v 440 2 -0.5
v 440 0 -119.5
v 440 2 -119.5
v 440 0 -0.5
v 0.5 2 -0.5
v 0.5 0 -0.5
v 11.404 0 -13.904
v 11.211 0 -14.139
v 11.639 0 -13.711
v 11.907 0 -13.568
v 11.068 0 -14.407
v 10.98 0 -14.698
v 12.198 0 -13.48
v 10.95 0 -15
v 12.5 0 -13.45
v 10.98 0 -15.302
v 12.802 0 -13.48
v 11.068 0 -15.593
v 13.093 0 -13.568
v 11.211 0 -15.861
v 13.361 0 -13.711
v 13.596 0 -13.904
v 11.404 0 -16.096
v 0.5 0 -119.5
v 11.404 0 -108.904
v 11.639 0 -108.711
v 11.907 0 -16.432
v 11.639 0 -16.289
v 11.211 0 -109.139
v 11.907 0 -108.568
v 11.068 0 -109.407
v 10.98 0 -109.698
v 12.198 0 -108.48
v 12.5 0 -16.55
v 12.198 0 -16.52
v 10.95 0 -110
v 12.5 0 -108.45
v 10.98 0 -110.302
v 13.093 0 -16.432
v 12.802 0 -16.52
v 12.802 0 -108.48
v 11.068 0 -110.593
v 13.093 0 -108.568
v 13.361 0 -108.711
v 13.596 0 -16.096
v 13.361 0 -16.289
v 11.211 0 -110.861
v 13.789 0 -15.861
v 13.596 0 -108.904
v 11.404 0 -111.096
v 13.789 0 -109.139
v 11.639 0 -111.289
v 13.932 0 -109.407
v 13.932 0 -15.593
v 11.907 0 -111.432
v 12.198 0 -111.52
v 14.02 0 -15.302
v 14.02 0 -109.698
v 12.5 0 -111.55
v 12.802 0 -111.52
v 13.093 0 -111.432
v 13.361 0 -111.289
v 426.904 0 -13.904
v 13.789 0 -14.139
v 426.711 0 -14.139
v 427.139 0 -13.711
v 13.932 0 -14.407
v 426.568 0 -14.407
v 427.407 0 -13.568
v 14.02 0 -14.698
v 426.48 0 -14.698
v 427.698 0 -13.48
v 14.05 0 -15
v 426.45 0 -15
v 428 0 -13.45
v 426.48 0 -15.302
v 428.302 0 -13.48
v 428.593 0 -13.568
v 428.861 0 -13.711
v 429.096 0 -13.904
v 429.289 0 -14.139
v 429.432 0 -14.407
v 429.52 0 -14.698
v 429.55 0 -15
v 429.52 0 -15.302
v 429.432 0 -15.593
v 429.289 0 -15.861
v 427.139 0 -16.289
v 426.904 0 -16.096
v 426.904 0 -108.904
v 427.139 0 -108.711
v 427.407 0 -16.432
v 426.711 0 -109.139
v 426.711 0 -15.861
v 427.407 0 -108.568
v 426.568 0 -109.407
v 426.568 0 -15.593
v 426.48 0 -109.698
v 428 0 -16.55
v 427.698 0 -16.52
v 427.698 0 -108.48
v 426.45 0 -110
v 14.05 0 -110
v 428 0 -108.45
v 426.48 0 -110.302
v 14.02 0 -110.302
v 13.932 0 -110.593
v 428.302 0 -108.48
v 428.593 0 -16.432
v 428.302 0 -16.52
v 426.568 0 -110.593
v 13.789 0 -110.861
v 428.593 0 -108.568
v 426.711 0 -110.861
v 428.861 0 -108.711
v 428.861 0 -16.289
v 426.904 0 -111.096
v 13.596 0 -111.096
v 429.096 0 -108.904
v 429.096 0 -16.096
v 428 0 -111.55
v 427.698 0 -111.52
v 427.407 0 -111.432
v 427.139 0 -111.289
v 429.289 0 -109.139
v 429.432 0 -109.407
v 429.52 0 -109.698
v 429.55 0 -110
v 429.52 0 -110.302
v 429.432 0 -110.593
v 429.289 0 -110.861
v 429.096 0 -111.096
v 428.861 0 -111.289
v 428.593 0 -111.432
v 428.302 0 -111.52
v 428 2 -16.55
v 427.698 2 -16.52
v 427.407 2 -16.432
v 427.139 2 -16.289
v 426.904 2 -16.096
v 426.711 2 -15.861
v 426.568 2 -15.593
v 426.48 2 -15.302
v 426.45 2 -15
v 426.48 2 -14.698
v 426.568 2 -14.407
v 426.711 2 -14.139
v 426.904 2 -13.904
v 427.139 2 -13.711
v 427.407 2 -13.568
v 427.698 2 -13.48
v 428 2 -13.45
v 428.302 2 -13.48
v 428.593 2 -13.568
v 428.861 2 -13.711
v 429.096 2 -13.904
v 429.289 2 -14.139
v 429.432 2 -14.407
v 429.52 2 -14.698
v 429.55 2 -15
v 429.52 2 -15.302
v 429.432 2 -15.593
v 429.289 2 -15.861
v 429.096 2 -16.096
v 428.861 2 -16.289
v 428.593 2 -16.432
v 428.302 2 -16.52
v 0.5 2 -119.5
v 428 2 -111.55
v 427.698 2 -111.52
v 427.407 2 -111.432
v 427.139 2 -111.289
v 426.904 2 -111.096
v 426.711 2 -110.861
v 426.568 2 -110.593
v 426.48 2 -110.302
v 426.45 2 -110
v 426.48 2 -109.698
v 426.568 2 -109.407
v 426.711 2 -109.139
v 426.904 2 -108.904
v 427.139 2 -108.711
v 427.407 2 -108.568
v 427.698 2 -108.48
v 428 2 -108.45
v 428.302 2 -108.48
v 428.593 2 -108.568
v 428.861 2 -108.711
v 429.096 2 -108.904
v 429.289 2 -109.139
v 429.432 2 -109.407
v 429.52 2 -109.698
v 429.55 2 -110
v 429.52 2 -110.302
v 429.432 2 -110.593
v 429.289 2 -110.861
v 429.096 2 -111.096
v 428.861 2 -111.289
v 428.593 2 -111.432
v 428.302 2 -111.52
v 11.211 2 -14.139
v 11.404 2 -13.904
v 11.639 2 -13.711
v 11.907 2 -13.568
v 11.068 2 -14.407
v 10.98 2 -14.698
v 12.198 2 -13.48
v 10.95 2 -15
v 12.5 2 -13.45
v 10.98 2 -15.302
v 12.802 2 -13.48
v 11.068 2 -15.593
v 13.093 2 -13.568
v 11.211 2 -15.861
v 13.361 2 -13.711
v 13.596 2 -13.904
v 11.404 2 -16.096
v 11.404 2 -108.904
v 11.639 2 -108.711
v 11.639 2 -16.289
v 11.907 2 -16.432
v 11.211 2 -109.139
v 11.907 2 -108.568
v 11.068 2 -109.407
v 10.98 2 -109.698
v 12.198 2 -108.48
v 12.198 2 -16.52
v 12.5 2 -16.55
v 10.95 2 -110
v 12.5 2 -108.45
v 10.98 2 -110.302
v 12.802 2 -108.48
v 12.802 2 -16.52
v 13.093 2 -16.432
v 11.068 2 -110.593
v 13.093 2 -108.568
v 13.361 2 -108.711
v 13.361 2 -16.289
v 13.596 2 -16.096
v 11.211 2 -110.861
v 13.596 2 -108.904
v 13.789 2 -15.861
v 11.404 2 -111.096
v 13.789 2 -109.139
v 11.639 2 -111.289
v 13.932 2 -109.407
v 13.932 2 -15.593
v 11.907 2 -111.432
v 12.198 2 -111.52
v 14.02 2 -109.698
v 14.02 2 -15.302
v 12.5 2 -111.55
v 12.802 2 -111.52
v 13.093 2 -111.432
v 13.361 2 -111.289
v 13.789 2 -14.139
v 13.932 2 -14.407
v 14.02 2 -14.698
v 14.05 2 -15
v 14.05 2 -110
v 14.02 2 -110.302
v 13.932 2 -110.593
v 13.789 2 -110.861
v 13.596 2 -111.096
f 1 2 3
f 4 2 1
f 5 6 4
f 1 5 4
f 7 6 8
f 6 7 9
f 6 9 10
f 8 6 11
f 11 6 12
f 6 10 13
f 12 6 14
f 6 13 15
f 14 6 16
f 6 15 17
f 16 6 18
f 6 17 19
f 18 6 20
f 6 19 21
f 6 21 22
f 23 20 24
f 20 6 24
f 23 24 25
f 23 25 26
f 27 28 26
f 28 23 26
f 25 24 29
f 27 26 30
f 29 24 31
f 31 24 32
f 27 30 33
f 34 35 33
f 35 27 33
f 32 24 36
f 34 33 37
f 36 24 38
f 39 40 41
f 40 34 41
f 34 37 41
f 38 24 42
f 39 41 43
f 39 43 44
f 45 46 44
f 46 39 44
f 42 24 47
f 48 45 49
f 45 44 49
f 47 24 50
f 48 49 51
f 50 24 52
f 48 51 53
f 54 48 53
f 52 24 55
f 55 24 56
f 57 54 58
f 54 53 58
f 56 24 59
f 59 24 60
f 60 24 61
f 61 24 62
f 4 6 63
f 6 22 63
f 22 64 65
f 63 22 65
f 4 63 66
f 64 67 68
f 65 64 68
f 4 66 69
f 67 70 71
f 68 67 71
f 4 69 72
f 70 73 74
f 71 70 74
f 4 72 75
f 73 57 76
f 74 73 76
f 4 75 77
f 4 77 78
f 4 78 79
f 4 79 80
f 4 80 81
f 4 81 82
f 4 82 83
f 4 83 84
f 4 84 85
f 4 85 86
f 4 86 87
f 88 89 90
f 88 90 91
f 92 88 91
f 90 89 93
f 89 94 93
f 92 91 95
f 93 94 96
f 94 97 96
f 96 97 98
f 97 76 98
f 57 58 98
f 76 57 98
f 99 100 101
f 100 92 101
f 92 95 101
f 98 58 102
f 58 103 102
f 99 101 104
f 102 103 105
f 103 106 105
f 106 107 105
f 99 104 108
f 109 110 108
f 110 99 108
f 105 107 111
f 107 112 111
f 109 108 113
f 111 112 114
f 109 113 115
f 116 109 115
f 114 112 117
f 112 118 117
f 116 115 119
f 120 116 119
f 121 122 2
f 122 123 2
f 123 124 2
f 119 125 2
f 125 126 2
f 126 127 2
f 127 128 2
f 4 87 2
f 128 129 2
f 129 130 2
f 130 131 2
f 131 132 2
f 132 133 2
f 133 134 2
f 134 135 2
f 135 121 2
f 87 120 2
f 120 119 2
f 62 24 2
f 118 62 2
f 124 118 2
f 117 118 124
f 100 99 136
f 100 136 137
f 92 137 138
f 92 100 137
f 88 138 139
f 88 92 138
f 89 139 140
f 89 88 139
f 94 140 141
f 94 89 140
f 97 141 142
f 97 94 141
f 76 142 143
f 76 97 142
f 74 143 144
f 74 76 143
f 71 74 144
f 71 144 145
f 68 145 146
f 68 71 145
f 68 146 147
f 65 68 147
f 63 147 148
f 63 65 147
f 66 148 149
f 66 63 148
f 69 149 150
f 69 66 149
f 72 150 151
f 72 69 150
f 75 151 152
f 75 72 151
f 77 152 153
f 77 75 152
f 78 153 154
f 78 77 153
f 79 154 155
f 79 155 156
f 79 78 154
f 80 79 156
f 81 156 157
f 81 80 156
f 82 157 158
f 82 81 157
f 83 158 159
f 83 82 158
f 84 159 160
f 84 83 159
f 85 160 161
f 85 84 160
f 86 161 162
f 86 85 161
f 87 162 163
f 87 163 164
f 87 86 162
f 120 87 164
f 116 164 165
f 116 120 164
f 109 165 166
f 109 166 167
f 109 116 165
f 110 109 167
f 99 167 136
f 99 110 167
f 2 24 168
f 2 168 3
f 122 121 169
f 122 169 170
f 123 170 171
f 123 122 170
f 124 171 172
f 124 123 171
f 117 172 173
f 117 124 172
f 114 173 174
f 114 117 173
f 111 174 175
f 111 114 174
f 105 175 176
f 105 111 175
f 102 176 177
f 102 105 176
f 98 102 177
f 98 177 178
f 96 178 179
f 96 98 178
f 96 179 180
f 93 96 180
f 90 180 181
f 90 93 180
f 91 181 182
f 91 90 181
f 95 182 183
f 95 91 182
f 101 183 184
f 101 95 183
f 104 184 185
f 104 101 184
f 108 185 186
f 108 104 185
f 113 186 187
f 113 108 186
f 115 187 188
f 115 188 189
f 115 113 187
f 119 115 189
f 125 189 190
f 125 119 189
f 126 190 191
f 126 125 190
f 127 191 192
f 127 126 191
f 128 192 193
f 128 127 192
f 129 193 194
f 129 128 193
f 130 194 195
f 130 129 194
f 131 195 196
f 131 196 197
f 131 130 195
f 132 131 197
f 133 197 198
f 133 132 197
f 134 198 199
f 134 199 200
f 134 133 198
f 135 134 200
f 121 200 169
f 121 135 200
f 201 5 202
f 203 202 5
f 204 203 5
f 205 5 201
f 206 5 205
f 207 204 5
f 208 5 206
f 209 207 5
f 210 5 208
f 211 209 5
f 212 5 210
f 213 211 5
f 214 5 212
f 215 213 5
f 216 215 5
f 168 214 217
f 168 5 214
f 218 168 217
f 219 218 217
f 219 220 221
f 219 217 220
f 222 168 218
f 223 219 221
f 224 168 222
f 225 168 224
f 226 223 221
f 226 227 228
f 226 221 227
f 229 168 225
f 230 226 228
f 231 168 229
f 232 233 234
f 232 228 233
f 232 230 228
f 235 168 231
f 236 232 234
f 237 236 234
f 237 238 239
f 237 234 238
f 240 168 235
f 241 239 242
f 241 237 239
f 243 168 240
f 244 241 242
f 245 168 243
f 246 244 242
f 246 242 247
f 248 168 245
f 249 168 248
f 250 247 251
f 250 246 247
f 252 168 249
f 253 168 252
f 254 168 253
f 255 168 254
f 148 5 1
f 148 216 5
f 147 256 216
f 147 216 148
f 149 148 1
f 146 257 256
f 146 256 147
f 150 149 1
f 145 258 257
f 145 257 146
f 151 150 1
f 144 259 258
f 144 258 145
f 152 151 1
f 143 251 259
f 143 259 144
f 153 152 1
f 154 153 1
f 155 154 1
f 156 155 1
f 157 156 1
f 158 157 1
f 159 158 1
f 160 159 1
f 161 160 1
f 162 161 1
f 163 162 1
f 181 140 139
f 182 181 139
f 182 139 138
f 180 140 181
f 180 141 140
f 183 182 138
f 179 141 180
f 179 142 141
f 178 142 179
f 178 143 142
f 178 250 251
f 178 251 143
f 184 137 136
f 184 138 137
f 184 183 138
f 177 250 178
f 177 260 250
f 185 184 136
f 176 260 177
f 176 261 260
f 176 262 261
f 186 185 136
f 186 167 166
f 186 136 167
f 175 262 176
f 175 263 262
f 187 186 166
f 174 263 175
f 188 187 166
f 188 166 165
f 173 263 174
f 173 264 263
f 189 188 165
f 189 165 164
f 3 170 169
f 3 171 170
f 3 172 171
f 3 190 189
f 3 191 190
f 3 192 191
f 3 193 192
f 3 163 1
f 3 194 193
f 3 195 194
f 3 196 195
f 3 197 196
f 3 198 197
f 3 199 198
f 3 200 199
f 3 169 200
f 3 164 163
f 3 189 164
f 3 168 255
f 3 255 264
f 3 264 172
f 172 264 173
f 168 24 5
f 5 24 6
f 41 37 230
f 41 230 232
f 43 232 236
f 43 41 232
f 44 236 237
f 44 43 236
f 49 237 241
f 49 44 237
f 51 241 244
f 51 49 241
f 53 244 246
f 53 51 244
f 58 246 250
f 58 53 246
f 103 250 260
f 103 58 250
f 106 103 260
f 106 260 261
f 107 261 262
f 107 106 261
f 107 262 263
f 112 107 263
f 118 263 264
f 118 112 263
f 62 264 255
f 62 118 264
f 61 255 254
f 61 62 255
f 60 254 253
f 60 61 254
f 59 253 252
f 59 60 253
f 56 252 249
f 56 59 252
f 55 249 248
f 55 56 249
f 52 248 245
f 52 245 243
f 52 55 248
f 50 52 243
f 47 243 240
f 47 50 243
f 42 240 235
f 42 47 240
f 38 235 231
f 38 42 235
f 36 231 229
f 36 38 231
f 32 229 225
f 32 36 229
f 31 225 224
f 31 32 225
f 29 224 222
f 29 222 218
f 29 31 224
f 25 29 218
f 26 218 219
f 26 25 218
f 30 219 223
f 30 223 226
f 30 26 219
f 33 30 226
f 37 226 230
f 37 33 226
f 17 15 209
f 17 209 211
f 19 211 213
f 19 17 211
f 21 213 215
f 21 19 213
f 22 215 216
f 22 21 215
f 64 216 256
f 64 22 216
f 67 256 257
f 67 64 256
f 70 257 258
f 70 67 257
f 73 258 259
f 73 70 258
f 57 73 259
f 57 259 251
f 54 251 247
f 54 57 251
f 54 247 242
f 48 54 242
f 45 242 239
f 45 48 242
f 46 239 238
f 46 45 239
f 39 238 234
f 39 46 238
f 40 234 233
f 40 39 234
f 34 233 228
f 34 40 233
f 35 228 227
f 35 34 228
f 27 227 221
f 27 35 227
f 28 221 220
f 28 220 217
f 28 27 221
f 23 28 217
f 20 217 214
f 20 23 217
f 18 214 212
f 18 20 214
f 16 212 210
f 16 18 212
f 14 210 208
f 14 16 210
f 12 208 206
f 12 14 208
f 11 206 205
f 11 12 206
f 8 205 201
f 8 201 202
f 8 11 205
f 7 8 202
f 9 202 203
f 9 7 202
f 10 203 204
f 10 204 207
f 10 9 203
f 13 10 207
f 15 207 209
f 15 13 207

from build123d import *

# Parameters (mm, degrees)
CROQUIS1_W              = 440.5
CROQUIS1_H              = 120
CROQUIS1_R              = 1.55
SALIENTE_EXTRUIR1_DEPTH = 2
CROQUIS2_W              = 440.5
CROQUIS2_H              = 120
CROQUIS2_W_2            = 439.5
CROQUIS2_H_2            = 119
CORTAR_EXTRUIR1_DEPTH   = 2


with BuildPart() as part:
    # Croquis1 → Saliente-Extruir1 (new body)
    with BuildSketch(Plane(origin=(0, 0, 0), x_dir=(1, 0, 0), z_dir=(0, 1, 0))):
        with Locations((220.25, 60)):
            Rectangle(CROQUIS1_W, CROQUIS1_H)
        with Locations(Location((12.5, 15, 0), (0, 0, 270))):
            Circle(CROQUIS1_R, mode=Mode.SUBTRACT)
        with Locations(Location((12.5, 110, 0), (0, 0, 270))):
            Circle(CROQUIS1_R, mode=Mode.SUBTRACT)
        with Locations(Location((428, 15, 0), (0, 0, 90))):
            Circle(CROQUIS1_R, mode=Mode.SUBTRACT)
        with Locations(Location((428, 110, 0), (0, 0, 90))):
            Circle(CROQUIS1_R, mode=Mode.SUBTRACT)
    extrude(amount=SALIENTE_EXTRUIR1_DEPTH)

    # Croquis2 → Cortar-Extruir1 (cut)
    with BuildSketch(Plane.XZ):
        with Locations((220.25, -60)):
            Rectangle(CROQUIS2_W, CROQUIS2_H)
        with Locations((220.25, -60)):
            Rectangle(CROQUIS2_W_2, CROQUIS2_H_2, mode=Mode.SUBTRACT)
    extrude(amount=-CORTAR_EXTRUIR1_DEPTH, mode=Mode.SUBTRACT)


solid = part.part
